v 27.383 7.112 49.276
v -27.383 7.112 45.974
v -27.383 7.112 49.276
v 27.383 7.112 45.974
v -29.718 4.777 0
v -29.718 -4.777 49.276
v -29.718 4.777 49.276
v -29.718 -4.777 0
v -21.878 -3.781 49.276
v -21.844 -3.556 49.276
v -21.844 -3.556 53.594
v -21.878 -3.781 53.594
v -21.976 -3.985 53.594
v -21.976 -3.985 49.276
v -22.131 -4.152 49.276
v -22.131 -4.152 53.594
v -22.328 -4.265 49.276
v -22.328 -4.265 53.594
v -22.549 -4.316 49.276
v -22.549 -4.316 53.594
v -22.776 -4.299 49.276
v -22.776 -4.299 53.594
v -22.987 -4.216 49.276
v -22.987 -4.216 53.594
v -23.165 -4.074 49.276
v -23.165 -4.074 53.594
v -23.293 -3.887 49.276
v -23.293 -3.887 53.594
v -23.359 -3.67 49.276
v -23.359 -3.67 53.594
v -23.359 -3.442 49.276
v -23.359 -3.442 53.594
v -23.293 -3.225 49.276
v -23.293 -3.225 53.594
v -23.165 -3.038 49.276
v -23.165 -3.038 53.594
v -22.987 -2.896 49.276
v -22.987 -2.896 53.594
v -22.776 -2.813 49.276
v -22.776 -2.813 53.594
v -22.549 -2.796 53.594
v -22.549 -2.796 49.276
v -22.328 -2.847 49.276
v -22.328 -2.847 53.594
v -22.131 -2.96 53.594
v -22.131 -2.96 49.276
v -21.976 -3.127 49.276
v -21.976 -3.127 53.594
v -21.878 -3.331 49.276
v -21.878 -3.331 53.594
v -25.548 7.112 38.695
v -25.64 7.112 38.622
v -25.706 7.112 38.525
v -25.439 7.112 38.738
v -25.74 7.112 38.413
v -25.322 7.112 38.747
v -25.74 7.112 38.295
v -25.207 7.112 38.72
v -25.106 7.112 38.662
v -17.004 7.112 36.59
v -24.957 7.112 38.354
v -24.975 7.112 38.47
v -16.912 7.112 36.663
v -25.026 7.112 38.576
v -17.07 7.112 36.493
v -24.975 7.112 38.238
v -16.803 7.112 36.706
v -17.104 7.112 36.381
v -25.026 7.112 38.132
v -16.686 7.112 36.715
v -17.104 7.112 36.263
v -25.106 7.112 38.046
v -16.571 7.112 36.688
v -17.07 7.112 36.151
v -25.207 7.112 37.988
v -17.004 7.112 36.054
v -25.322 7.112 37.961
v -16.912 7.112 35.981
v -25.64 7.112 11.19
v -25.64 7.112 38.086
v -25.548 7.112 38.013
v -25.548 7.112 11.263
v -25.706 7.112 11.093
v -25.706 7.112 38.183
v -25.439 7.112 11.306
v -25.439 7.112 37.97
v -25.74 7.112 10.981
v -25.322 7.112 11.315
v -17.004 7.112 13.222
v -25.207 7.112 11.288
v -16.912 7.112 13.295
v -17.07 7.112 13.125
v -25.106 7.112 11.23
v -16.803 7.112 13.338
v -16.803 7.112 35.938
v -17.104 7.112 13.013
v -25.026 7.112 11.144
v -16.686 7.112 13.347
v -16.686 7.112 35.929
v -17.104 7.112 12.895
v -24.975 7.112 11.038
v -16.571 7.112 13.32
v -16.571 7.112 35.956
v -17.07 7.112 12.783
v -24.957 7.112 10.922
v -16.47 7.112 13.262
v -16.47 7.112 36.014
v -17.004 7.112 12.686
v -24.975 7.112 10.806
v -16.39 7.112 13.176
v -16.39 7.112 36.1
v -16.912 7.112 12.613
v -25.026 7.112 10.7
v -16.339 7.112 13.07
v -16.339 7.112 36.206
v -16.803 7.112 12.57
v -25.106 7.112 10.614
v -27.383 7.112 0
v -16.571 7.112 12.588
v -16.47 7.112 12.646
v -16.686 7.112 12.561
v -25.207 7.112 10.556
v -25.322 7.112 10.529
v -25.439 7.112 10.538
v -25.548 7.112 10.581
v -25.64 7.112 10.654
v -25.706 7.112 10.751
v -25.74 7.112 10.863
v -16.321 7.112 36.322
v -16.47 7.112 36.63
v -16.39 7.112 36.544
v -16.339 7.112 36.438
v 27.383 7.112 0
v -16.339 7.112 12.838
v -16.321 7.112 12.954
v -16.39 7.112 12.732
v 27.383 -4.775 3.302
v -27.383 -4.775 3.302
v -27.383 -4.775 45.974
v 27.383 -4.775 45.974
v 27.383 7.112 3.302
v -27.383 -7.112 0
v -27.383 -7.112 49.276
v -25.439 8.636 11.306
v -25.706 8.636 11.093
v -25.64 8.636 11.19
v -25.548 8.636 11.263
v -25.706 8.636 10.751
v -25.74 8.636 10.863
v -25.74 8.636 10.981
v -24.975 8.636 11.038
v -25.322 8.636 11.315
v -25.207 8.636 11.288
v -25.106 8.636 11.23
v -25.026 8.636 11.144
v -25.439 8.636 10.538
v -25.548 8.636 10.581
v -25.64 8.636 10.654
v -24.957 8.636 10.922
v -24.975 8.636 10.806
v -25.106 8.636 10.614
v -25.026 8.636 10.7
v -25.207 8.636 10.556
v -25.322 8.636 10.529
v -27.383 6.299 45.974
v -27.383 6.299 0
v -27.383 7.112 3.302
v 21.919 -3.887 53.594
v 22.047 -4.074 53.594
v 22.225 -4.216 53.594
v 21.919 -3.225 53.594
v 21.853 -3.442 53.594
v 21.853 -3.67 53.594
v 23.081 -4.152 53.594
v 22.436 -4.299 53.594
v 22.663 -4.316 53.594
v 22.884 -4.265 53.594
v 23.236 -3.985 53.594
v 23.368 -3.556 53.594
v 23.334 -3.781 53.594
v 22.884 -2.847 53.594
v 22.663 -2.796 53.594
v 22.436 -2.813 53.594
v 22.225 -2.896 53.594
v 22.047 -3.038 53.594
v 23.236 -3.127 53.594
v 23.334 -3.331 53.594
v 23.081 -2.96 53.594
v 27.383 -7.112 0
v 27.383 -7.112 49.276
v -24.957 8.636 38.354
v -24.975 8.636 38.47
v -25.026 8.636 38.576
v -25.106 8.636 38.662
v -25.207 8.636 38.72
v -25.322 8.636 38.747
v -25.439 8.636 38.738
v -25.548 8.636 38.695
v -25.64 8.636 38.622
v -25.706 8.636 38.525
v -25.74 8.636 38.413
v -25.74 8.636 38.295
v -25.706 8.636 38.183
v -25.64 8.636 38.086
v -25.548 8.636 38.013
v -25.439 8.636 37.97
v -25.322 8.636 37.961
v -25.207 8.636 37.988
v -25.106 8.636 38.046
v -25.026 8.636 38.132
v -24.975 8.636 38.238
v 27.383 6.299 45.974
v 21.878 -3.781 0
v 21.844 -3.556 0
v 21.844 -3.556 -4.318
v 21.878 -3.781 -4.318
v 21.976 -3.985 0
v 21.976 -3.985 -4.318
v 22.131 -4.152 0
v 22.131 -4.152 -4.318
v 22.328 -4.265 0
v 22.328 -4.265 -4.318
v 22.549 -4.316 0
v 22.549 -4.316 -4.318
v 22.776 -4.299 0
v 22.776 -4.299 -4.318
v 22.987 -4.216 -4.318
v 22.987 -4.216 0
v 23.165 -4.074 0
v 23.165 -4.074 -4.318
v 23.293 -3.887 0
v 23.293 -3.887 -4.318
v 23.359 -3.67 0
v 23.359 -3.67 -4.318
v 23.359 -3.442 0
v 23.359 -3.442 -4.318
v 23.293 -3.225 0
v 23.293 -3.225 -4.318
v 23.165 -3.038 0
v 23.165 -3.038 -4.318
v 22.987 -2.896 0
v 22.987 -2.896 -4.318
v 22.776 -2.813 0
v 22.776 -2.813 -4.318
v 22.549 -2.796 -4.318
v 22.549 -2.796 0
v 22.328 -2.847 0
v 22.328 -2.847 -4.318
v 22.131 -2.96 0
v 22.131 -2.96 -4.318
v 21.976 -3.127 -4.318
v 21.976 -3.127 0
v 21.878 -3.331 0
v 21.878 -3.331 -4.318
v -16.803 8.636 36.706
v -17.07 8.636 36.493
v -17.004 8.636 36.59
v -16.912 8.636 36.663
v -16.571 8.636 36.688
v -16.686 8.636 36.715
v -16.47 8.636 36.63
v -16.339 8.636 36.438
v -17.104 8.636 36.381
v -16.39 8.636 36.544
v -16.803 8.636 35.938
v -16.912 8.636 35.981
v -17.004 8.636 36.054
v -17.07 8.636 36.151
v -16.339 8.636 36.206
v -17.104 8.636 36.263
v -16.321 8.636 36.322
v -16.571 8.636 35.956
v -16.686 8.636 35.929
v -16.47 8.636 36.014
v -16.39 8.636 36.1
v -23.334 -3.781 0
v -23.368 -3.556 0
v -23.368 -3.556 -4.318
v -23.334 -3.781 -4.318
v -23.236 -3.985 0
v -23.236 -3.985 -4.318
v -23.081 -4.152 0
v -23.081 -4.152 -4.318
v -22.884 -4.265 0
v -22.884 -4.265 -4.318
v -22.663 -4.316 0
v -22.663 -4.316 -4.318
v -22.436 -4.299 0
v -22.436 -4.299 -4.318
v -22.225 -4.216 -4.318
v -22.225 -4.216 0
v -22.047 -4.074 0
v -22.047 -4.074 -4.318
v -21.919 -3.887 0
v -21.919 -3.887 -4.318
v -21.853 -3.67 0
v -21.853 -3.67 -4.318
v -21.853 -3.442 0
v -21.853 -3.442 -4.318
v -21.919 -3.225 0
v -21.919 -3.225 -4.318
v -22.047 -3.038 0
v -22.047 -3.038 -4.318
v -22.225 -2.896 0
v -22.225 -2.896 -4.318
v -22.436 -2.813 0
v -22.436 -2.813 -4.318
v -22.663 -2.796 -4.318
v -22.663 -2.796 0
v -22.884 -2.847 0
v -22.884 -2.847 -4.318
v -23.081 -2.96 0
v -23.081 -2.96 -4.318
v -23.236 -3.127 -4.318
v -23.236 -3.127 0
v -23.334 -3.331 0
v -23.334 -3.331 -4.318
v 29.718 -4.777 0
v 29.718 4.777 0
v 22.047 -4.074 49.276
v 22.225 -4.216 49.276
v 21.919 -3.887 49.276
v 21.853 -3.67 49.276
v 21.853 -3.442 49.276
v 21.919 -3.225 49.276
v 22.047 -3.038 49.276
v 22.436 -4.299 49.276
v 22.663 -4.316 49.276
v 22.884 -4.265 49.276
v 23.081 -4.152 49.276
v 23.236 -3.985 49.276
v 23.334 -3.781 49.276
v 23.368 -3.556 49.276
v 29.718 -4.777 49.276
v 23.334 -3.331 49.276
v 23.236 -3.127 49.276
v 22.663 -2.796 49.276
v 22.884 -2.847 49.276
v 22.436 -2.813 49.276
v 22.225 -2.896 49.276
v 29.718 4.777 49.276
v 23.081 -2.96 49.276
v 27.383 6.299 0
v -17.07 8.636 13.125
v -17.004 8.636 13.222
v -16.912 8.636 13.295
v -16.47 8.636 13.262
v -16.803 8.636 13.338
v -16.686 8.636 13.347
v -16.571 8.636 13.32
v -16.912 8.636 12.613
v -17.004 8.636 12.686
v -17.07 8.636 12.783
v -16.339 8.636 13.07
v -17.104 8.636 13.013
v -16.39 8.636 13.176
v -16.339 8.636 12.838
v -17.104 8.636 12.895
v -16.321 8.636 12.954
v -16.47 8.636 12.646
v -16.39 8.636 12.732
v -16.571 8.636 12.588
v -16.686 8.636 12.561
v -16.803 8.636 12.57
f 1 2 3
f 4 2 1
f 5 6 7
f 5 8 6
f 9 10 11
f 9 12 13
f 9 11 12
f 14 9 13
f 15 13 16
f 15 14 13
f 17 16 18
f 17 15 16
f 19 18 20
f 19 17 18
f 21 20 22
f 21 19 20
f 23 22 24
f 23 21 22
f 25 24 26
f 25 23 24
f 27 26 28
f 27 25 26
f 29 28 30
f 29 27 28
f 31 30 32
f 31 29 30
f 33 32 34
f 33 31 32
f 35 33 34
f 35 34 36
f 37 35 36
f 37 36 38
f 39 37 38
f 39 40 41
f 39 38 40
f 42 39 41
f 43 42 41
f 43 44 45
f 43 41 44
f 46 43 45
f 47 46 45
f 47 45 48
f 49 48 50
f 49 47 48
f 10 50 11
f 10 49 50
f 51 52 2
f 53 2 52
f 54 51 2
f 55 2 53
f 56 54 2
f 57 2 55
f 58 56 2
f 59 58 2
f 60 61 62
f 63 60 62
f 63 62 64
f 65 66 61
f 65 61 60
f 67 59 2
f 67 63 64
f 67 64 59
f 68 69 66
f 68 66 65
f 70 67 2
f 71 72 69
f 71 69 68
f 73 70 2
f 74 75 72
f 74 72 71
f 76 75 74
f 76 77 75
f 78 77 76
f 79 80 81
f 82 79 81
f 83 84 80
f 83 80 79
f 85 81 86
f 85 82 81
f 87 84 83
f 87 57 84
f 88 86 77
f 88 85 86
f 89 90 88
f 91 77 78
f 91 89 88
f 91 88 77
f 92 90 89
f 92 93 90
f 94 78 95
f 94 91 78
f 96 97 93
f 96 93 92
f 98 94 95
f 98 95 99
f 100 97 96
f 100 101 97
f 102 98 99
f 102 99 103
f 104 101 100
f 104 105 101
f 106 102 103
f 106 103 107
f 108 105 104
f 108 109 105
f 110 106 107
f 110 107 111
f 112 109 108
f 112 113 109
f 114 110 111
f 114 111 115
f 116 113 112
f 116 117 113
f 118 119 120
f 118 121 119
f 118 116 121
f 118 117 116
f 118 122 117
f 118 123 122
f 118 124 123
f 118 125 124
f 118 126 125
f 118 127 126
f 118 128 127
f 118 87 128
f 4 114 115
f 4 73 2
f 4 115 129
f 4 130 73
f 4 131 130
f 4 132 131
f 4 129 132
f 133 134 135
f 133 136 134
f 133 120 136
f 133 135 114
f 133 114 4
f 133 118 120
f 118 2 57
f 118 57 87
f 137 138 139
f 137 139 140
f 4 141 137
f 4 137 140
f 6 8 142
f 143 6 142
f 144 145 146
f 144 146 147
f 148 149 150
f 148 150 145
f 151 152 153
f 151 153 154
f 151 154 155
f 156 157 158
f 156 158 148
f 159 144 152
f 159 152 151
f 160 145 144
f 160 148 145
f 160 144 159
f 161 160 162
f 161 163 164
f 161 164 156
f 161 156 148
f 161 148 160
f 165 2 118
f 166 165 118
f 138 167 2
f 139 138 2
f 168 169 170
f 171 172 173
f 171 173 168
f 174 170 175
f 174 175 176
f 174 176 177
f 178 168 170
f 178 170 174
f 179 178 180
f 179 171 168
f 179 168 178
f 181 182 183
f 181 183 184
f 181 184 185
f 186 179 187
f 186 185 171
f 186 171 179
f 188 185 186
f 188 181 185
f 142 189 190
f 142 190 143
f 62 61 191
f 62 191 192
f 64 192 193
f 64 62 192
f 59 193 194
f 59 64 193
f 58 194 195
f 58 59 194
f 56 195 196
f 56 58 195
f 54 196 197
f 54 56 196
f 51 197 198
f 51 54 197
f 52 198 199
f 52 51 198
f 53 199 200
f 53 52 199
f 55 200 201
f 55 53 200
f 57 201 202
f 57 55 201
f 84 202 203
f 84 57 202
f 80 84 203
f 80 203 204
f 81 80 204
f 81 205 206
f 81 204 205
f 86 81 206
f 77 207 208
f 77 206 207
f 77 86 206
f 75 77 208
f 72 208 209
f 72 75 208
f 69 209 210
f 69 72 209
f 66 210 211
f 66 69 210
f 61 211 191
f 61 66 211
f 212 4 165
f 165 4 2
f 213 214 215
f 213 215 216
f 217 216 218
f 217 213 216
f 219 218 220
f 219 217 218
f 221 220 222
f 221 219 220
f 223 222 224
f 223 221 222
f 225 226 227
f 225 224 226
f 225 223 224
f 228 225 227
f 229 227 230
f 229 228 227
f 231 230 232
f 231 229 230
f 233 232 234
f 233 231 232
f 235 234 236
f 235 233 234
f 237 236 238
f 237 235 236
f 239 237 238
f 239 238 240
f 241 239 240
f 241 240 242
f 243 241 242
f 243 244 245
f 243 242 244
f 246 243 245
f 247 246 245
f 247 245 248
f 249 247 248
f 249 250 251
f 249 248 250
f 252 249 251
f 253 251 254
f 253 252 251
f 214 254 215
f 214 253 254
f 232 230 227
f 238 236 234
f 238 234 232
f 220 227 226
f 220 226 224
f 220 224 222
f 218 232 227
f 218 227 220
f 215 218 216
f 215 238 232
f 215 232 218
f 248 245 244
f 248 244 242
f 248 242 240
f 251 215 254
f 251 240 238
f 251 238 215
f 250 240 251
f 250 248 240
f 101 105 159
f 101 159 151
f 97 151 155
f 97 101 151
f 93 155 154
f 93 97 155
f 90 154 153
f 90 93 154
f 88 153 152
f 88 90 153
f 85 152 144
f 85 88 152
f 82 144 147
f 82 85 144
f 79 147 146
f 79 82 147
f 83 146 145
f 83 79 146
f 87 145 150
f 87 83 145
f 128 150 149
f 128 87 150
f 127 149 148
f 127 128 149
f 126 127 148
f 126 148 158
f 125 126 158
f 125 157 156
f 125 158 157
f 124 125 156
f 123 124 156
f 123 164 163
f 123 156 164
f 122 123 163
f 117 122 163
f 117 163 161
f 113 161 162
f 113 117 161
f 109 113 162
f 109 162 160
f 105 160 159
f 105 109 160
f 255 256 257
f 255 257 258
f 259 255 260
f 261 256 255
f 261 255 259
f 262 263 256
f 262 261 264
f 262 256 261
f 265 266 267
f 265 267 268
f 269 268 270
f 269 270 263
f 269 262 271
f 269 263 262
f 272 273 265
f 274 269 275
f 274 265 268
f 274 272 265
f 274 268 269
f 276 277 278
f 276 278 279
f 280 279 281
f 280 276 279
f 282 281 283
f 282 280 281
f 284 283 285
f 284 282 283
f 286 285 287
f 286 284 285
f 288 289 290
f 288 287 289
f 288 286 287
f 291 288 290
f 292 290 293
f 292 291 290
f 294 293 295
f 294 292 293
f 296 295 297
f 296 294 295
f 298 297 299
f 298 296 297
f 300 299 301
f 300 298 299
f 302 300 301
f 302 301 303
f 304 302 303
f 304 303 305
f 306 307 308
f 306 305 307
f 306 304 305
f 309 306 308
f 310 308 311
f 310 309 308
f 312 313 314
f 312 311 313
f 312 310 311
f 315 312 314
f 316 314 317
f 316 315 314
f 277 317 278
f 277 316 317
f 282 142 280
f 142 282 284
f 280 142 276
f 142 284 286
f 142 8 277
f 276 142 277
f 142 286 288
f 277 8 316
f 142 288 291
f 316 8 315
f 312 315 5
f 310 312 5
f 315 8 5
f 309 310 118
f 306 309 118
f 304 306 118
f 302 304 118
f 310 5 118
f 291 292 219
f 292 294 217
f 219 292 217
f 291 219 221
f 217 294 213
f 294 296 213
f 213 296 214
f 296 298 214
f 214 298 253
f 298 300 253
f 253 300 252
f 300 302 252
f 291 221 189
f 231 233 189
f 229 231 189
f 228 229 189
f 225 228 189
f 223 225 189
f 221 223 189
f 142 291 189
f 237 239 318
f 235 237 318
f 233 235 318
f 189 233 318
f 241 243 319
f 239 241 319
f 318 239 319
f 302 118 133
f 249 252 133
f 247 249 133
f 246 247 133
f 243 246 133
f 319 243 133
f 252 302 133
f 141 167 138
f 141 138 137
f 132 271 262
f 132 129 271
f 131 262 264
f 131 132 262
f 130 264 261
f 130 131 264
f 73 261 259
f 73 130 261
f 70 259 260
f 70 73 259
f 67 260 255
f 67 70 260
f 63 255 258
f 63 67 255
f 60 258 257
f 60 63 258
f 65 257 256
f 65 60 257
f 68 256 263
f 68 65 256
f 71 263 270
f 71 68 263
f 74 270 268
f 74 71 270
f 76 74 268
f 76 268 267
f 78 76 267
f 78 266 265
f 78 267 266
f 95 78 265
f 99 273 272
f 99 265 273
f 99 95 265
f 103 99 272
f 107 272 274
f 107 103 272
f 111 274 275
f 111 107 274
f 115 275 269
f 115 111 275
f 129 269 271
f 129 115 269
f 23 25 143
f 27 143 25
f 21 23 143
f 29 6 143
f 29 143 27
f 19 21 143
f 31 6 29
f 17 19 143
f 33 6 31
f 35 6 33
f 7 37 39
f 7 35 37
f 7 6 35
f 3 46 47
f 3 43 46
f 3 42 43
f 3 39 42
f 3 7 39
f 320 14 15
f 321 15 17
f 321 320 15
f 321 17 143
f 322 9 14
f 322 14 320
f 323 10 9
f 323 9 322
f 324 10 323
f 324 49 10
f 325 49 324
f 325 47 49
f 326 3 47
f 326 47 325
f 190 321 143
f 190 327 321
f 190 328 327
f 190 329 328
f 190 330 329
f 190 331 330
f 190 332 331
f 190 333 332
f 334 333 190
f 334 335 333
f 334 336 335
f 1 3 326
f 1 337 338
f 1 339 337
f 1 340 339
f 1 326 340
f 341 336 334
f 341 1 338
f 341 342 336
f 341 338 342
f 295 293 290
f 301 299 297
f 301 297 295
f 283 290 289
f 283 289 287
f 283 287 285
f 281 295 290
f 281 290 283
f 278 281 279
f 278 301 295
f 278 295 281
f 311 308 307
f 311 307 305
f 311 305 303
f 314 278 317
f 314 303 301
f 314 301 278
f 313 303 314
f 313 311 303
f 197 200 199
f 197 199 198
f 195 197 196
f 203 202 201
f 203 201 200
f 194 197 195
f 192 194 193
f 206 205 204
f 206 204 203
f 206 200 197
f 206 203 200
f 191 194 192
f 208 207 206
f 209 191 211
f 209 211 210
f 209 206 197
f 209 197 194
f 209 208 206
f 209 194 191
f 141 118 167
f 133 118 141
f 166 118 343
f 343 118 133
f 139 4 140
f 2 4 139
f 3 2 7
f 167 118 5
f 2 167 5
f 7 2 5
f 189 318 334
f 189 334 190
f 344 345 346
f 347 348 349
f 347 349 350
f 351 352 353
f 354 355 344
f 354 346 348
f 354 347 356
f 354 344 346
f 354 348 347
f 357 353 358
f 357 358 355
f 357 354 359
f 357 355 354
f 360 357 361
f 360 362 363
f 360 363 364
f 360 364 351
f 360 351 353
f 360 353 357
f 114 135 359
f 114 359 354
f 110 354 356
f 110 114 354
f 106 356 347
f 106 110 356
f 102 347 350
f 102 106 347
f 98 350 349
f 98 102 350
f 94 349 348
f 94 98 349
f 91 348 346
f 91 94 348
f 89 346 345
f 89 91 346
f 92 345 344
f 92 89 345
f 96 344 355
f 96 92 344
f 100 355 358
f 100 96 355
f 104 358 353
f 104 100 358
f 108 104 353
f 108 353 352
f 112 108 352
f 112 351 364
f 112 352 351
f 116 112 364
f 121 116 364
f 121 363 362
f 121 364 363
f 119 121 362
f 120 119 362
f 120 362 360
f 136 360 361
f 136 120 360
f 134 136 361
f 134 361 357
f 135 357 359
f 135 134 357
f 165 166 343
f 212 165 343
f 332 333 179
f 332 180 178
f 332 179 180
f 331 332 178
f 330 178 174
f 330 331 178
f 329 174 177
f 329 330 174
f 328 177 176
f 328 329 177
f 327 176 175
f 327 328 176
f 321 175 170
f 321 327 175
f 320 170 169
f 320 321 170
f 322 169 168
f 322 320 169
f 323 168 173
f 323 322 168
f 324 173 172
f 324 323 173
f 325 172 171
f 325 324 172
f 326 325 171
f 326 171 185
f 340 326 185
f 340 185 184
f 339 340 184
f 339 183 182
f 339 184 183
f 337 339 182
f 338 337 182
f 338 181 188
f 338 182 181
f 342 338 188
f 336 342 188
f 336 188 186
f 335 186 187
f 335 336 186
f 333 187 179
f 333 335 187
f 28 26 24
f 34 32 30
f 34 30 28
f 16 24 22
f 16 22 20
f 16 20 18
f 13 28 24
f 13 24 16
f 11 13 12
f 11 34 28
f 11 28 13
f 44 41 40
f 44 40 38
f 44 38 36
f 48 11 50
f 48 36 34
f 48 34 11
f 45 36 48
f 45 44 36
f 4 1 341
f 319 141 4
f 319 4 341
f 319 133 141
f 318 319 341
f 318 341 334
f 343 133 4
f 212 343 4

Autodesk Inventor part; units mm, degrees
ref_plane "YZ Plane" through (0, 0, 0) normal (1, 0, 0) x (0, 1, 0)
ref_plane "XZ Plane" through (0, 0, 0) normal (0, 1, 0) x (-1, 0, 0)
ref_plane "XY Plane" through (0, 0, 0) normal (0, 0, 1) x (1, 0, 0)
sketch "Sketch1" plane through (0, 0, 0) normal (0, 0, 1) x (1, 0, 0)
  line L0 (-27.3831, 7.112) -> (27.3831, 7.112)
  line L1 (29.718, 4.7771) -> (29.718, -4.7771)
  line L2 (27.3831, -7.112) -> (-27.3831, -7.112)
  line L3 (-29.718, -4.7771) -> (-29.718, 4.7771)
  line L4 (-27.3831, 7.112) -> (-29.718, 4.7771)
  line L5 (-29.718, -4.7771) -> (-27.3831, -7.112)
  line L6 (27.3831, 7.112) -> (29.718, 4.7771)
  line L7 (29.718, -4.7771) -> (27.3831, -7.112)
  point P0 (0, 0)
  point P1 (-29.718, 7.112)
  point P2 (29.718, -7.112)
  point P3 (29.718, 7.112)
  point P4 (-29.718, -7.112)
  point P5 (29.718, 0)
  point P6 (0, 7.112)
  dimension "d0" = 59.436
  dimension "d1" = 14.224
  dimension "d4" = 3.302
  dimension "d5" = 135
  dimension "d7" = 45
  dimension "d8" = 3.302
  dimension "d10" = 45
  dimension "d11" = 3.302
  dimension "d13" = 45
  dimension "d14" = 3.302
extrude "Extrusion1" add sketch "Sketch1" along normal blind 49.276
sketch "Sketch2" plane through (0, 0, 49.276) normal (0, 0, 1) x (1, 0, 0)
  circle A0 centre (-22.606, -3.556) radius 0.762
  line L0 (-27.3831, -7.112) -> (27.3831, -7.112) projected
  circle A1 centre (22.606, -3.556) radius 0.762
  line L1 (-29.718, 4.7771) -> (-29.718, -4.7771) projected
  line L2 (29.718, -4.7771) -> (29.718, 4.7771) projected
  point P0 (0, 0)
  dimension "d17" = 3.556
  dimension "d18" = 3.556
  dimension "d19" = 1.524
  dimension "d20" = 1.524
  dimension "d21" = 7.112
  dimension "d22" = 7.112
extrude "Extrusion2" add sketch "Sketch2" along normal blind 4.318
sketch "Sketch3" plane through (0, 0, 0) normal (0, 0, -1) x (-1, 0, 0)
  circle A0 centre (22.606, -3.556) radius 0.762 projected
  circle A1 centre (-22.606, -3.556) radius 0.762 projected
  circle A2 centre (-22.606, -3.556) radius 0.762
  circle A3 centre (22.606, -3.556) radius 0.762
  point P0 (0, 0)
extrude "Extrusion3" add sketch "Sketch3" along normal blind 4.318
sketch "Sketch4" plane through (-27.3831, 7.112, 0) normal (0, 1, 0) x (1, 0, 0)
  line L0 (0, 0) -> (0, -49.276) projected
  line L1 (54.7663, 0) -> (54.7663, -49.276) projected
  line L2 (0, -3.302) -> (54.7663, -3.302)
  line L3 (54.7663, -3.302) -> (54.7663, -45.974)
  line L4 (54.7663, -45.974) -> (0, -45.974)
  line L5 (0, -45.974) -> (0, -3.302)
  point P0 (27.3831, 0)
  dimension "d30" = 42.672
  dimension "d31" = 3.302
extrude "Extrusion4" cut sketch "Sketch4" against normal blind 11.8872
sketch "Sketch5" plane through (-27.3831, 7.112, 0) normal (0, 1, 0) x (1, 0, 0)
  line L0 (0, 0) -> (-2.3349, 0) projected
  line L1 (54.7663, -3.302) -> (54.7663, -45.974) projected
  line L2 (0, 0) -> (54.7663, 0)
  line L3 (54.7663, 0) -> (54.7663, -45.974)
  line L4 (54.7663, -45.974) -> (0, -45.974)
  line L5 (0, -45.974) -> (0, 0)
  point P0 (27.3831, 0)
extrude "Extrusion5" add sketch "Sketch5" against normal blind 0.8128 separate body
sketch "Sketch6" plane through (-27.3831, 7.112, 0) normal (0, 1, 0) x (1, 0, 0)
  line L0 (0, -3.302) -> (0, -45.974) projected
  line L1 (54.7663, -3.302) -> (54.7663, -45.974) projected
  line L2 (54.7663, -49.276) -> (0, -49.276) projected
  line L3 (54.7663, 0) -> (0, 0) projected
  line L4 (0, 0) -> (0, -3.302) projected
  line L5 (0, -45.974) -> (0, -49.276) projected
  line L6 (54.7663, -45.974) -> (54.7663, -49.276) projected
  line L7 (54.7663, 0) -> (54.7663, -3.302) projected
  circle A0 centre (1.778, -44.704) radius 0.3937
  circle A1 centre (1.778, -4.572) radius 0.3937
  circle A2 centre (52.9883, -44.704) radius 0.3937
  circle A3 centre (52.9883, -4.572) radius 0.3937
  circle A4 centre (2.032, -38.354) radius 0.3937
  circle A5 centre (2.032, -10.922) radius 0.3937
  circle A6 centre (10.668, -36.322) radius 0.3937
  circle A7 centre (10.668, -12.954) radius 0.3937
  point P0 (27.3831, 0)
  point P1 (20.7303, -8.4836)
  point P2 (41.8123, -8.4836)
  point P3 (25.5563, -17.78)
  point P4 (48.1623, -17.78)
  point P5 (48.1623, -39.37)
  point P6 (25.5563, -39.37)
  dimension "d40" = 21.082
  dimension "d43" = 12.954
  dimension "d48" = 1.778
  dimension "d49" = 1.778
  dimension "d50" = 1.778
  dimension "d51" = 1.778
  dimension "d53" = 22.606
  dimension "d55" = 22.606
  dimension "d56" = 21.59
  dimension "d57" = 21.59
  dimension "d62" = 6.604
  dimension "d74" = 2.032
  dimension "d77" = 8.636
  dimension "d78" = 8.636
  dimension "d79" = 2.032
  dimension "d80" = 2.032
  dimension "d83" = 4.572
  dimension "d84" = 4.572
  dimension "d85" = 4.572
  dimension "d86" = 4.572
  dimension "d87" = 0.7874
  dimension "d88" = 0.7874
  dimension "d89" = 0.7874
  dimension "d90" = 0.7874
  dimension "d91" = 0.7874
  dimension "d92" = 0.7874
  dimension "d93" = 0.7874
  dimension "d94" = 0.7874
  dimension "d95" = 10.922
  dimension "d96" = 10.922
extrude "Extrusion6" add sketch "Sketch6" along normal blind 1.524 contours A4 | A5 | A6 | A7 bodies 2
equation "\"d18\" = d17"
equation "\"d22\" = d21"
equation "\"d48\" = d49"
equation "\"d50\" = d48"
equation "\"d51\" = d48"
equation "\"d55\" = d53"
equation "\"d57\" = d56"
equation "\"d78\" = d77"
equation "\"d80\" = d79"
equation "\"d84\" = d83"
equation "\"d85\" = d83"
equation "\"d86\" = d83"
properties part number "Chassis"
